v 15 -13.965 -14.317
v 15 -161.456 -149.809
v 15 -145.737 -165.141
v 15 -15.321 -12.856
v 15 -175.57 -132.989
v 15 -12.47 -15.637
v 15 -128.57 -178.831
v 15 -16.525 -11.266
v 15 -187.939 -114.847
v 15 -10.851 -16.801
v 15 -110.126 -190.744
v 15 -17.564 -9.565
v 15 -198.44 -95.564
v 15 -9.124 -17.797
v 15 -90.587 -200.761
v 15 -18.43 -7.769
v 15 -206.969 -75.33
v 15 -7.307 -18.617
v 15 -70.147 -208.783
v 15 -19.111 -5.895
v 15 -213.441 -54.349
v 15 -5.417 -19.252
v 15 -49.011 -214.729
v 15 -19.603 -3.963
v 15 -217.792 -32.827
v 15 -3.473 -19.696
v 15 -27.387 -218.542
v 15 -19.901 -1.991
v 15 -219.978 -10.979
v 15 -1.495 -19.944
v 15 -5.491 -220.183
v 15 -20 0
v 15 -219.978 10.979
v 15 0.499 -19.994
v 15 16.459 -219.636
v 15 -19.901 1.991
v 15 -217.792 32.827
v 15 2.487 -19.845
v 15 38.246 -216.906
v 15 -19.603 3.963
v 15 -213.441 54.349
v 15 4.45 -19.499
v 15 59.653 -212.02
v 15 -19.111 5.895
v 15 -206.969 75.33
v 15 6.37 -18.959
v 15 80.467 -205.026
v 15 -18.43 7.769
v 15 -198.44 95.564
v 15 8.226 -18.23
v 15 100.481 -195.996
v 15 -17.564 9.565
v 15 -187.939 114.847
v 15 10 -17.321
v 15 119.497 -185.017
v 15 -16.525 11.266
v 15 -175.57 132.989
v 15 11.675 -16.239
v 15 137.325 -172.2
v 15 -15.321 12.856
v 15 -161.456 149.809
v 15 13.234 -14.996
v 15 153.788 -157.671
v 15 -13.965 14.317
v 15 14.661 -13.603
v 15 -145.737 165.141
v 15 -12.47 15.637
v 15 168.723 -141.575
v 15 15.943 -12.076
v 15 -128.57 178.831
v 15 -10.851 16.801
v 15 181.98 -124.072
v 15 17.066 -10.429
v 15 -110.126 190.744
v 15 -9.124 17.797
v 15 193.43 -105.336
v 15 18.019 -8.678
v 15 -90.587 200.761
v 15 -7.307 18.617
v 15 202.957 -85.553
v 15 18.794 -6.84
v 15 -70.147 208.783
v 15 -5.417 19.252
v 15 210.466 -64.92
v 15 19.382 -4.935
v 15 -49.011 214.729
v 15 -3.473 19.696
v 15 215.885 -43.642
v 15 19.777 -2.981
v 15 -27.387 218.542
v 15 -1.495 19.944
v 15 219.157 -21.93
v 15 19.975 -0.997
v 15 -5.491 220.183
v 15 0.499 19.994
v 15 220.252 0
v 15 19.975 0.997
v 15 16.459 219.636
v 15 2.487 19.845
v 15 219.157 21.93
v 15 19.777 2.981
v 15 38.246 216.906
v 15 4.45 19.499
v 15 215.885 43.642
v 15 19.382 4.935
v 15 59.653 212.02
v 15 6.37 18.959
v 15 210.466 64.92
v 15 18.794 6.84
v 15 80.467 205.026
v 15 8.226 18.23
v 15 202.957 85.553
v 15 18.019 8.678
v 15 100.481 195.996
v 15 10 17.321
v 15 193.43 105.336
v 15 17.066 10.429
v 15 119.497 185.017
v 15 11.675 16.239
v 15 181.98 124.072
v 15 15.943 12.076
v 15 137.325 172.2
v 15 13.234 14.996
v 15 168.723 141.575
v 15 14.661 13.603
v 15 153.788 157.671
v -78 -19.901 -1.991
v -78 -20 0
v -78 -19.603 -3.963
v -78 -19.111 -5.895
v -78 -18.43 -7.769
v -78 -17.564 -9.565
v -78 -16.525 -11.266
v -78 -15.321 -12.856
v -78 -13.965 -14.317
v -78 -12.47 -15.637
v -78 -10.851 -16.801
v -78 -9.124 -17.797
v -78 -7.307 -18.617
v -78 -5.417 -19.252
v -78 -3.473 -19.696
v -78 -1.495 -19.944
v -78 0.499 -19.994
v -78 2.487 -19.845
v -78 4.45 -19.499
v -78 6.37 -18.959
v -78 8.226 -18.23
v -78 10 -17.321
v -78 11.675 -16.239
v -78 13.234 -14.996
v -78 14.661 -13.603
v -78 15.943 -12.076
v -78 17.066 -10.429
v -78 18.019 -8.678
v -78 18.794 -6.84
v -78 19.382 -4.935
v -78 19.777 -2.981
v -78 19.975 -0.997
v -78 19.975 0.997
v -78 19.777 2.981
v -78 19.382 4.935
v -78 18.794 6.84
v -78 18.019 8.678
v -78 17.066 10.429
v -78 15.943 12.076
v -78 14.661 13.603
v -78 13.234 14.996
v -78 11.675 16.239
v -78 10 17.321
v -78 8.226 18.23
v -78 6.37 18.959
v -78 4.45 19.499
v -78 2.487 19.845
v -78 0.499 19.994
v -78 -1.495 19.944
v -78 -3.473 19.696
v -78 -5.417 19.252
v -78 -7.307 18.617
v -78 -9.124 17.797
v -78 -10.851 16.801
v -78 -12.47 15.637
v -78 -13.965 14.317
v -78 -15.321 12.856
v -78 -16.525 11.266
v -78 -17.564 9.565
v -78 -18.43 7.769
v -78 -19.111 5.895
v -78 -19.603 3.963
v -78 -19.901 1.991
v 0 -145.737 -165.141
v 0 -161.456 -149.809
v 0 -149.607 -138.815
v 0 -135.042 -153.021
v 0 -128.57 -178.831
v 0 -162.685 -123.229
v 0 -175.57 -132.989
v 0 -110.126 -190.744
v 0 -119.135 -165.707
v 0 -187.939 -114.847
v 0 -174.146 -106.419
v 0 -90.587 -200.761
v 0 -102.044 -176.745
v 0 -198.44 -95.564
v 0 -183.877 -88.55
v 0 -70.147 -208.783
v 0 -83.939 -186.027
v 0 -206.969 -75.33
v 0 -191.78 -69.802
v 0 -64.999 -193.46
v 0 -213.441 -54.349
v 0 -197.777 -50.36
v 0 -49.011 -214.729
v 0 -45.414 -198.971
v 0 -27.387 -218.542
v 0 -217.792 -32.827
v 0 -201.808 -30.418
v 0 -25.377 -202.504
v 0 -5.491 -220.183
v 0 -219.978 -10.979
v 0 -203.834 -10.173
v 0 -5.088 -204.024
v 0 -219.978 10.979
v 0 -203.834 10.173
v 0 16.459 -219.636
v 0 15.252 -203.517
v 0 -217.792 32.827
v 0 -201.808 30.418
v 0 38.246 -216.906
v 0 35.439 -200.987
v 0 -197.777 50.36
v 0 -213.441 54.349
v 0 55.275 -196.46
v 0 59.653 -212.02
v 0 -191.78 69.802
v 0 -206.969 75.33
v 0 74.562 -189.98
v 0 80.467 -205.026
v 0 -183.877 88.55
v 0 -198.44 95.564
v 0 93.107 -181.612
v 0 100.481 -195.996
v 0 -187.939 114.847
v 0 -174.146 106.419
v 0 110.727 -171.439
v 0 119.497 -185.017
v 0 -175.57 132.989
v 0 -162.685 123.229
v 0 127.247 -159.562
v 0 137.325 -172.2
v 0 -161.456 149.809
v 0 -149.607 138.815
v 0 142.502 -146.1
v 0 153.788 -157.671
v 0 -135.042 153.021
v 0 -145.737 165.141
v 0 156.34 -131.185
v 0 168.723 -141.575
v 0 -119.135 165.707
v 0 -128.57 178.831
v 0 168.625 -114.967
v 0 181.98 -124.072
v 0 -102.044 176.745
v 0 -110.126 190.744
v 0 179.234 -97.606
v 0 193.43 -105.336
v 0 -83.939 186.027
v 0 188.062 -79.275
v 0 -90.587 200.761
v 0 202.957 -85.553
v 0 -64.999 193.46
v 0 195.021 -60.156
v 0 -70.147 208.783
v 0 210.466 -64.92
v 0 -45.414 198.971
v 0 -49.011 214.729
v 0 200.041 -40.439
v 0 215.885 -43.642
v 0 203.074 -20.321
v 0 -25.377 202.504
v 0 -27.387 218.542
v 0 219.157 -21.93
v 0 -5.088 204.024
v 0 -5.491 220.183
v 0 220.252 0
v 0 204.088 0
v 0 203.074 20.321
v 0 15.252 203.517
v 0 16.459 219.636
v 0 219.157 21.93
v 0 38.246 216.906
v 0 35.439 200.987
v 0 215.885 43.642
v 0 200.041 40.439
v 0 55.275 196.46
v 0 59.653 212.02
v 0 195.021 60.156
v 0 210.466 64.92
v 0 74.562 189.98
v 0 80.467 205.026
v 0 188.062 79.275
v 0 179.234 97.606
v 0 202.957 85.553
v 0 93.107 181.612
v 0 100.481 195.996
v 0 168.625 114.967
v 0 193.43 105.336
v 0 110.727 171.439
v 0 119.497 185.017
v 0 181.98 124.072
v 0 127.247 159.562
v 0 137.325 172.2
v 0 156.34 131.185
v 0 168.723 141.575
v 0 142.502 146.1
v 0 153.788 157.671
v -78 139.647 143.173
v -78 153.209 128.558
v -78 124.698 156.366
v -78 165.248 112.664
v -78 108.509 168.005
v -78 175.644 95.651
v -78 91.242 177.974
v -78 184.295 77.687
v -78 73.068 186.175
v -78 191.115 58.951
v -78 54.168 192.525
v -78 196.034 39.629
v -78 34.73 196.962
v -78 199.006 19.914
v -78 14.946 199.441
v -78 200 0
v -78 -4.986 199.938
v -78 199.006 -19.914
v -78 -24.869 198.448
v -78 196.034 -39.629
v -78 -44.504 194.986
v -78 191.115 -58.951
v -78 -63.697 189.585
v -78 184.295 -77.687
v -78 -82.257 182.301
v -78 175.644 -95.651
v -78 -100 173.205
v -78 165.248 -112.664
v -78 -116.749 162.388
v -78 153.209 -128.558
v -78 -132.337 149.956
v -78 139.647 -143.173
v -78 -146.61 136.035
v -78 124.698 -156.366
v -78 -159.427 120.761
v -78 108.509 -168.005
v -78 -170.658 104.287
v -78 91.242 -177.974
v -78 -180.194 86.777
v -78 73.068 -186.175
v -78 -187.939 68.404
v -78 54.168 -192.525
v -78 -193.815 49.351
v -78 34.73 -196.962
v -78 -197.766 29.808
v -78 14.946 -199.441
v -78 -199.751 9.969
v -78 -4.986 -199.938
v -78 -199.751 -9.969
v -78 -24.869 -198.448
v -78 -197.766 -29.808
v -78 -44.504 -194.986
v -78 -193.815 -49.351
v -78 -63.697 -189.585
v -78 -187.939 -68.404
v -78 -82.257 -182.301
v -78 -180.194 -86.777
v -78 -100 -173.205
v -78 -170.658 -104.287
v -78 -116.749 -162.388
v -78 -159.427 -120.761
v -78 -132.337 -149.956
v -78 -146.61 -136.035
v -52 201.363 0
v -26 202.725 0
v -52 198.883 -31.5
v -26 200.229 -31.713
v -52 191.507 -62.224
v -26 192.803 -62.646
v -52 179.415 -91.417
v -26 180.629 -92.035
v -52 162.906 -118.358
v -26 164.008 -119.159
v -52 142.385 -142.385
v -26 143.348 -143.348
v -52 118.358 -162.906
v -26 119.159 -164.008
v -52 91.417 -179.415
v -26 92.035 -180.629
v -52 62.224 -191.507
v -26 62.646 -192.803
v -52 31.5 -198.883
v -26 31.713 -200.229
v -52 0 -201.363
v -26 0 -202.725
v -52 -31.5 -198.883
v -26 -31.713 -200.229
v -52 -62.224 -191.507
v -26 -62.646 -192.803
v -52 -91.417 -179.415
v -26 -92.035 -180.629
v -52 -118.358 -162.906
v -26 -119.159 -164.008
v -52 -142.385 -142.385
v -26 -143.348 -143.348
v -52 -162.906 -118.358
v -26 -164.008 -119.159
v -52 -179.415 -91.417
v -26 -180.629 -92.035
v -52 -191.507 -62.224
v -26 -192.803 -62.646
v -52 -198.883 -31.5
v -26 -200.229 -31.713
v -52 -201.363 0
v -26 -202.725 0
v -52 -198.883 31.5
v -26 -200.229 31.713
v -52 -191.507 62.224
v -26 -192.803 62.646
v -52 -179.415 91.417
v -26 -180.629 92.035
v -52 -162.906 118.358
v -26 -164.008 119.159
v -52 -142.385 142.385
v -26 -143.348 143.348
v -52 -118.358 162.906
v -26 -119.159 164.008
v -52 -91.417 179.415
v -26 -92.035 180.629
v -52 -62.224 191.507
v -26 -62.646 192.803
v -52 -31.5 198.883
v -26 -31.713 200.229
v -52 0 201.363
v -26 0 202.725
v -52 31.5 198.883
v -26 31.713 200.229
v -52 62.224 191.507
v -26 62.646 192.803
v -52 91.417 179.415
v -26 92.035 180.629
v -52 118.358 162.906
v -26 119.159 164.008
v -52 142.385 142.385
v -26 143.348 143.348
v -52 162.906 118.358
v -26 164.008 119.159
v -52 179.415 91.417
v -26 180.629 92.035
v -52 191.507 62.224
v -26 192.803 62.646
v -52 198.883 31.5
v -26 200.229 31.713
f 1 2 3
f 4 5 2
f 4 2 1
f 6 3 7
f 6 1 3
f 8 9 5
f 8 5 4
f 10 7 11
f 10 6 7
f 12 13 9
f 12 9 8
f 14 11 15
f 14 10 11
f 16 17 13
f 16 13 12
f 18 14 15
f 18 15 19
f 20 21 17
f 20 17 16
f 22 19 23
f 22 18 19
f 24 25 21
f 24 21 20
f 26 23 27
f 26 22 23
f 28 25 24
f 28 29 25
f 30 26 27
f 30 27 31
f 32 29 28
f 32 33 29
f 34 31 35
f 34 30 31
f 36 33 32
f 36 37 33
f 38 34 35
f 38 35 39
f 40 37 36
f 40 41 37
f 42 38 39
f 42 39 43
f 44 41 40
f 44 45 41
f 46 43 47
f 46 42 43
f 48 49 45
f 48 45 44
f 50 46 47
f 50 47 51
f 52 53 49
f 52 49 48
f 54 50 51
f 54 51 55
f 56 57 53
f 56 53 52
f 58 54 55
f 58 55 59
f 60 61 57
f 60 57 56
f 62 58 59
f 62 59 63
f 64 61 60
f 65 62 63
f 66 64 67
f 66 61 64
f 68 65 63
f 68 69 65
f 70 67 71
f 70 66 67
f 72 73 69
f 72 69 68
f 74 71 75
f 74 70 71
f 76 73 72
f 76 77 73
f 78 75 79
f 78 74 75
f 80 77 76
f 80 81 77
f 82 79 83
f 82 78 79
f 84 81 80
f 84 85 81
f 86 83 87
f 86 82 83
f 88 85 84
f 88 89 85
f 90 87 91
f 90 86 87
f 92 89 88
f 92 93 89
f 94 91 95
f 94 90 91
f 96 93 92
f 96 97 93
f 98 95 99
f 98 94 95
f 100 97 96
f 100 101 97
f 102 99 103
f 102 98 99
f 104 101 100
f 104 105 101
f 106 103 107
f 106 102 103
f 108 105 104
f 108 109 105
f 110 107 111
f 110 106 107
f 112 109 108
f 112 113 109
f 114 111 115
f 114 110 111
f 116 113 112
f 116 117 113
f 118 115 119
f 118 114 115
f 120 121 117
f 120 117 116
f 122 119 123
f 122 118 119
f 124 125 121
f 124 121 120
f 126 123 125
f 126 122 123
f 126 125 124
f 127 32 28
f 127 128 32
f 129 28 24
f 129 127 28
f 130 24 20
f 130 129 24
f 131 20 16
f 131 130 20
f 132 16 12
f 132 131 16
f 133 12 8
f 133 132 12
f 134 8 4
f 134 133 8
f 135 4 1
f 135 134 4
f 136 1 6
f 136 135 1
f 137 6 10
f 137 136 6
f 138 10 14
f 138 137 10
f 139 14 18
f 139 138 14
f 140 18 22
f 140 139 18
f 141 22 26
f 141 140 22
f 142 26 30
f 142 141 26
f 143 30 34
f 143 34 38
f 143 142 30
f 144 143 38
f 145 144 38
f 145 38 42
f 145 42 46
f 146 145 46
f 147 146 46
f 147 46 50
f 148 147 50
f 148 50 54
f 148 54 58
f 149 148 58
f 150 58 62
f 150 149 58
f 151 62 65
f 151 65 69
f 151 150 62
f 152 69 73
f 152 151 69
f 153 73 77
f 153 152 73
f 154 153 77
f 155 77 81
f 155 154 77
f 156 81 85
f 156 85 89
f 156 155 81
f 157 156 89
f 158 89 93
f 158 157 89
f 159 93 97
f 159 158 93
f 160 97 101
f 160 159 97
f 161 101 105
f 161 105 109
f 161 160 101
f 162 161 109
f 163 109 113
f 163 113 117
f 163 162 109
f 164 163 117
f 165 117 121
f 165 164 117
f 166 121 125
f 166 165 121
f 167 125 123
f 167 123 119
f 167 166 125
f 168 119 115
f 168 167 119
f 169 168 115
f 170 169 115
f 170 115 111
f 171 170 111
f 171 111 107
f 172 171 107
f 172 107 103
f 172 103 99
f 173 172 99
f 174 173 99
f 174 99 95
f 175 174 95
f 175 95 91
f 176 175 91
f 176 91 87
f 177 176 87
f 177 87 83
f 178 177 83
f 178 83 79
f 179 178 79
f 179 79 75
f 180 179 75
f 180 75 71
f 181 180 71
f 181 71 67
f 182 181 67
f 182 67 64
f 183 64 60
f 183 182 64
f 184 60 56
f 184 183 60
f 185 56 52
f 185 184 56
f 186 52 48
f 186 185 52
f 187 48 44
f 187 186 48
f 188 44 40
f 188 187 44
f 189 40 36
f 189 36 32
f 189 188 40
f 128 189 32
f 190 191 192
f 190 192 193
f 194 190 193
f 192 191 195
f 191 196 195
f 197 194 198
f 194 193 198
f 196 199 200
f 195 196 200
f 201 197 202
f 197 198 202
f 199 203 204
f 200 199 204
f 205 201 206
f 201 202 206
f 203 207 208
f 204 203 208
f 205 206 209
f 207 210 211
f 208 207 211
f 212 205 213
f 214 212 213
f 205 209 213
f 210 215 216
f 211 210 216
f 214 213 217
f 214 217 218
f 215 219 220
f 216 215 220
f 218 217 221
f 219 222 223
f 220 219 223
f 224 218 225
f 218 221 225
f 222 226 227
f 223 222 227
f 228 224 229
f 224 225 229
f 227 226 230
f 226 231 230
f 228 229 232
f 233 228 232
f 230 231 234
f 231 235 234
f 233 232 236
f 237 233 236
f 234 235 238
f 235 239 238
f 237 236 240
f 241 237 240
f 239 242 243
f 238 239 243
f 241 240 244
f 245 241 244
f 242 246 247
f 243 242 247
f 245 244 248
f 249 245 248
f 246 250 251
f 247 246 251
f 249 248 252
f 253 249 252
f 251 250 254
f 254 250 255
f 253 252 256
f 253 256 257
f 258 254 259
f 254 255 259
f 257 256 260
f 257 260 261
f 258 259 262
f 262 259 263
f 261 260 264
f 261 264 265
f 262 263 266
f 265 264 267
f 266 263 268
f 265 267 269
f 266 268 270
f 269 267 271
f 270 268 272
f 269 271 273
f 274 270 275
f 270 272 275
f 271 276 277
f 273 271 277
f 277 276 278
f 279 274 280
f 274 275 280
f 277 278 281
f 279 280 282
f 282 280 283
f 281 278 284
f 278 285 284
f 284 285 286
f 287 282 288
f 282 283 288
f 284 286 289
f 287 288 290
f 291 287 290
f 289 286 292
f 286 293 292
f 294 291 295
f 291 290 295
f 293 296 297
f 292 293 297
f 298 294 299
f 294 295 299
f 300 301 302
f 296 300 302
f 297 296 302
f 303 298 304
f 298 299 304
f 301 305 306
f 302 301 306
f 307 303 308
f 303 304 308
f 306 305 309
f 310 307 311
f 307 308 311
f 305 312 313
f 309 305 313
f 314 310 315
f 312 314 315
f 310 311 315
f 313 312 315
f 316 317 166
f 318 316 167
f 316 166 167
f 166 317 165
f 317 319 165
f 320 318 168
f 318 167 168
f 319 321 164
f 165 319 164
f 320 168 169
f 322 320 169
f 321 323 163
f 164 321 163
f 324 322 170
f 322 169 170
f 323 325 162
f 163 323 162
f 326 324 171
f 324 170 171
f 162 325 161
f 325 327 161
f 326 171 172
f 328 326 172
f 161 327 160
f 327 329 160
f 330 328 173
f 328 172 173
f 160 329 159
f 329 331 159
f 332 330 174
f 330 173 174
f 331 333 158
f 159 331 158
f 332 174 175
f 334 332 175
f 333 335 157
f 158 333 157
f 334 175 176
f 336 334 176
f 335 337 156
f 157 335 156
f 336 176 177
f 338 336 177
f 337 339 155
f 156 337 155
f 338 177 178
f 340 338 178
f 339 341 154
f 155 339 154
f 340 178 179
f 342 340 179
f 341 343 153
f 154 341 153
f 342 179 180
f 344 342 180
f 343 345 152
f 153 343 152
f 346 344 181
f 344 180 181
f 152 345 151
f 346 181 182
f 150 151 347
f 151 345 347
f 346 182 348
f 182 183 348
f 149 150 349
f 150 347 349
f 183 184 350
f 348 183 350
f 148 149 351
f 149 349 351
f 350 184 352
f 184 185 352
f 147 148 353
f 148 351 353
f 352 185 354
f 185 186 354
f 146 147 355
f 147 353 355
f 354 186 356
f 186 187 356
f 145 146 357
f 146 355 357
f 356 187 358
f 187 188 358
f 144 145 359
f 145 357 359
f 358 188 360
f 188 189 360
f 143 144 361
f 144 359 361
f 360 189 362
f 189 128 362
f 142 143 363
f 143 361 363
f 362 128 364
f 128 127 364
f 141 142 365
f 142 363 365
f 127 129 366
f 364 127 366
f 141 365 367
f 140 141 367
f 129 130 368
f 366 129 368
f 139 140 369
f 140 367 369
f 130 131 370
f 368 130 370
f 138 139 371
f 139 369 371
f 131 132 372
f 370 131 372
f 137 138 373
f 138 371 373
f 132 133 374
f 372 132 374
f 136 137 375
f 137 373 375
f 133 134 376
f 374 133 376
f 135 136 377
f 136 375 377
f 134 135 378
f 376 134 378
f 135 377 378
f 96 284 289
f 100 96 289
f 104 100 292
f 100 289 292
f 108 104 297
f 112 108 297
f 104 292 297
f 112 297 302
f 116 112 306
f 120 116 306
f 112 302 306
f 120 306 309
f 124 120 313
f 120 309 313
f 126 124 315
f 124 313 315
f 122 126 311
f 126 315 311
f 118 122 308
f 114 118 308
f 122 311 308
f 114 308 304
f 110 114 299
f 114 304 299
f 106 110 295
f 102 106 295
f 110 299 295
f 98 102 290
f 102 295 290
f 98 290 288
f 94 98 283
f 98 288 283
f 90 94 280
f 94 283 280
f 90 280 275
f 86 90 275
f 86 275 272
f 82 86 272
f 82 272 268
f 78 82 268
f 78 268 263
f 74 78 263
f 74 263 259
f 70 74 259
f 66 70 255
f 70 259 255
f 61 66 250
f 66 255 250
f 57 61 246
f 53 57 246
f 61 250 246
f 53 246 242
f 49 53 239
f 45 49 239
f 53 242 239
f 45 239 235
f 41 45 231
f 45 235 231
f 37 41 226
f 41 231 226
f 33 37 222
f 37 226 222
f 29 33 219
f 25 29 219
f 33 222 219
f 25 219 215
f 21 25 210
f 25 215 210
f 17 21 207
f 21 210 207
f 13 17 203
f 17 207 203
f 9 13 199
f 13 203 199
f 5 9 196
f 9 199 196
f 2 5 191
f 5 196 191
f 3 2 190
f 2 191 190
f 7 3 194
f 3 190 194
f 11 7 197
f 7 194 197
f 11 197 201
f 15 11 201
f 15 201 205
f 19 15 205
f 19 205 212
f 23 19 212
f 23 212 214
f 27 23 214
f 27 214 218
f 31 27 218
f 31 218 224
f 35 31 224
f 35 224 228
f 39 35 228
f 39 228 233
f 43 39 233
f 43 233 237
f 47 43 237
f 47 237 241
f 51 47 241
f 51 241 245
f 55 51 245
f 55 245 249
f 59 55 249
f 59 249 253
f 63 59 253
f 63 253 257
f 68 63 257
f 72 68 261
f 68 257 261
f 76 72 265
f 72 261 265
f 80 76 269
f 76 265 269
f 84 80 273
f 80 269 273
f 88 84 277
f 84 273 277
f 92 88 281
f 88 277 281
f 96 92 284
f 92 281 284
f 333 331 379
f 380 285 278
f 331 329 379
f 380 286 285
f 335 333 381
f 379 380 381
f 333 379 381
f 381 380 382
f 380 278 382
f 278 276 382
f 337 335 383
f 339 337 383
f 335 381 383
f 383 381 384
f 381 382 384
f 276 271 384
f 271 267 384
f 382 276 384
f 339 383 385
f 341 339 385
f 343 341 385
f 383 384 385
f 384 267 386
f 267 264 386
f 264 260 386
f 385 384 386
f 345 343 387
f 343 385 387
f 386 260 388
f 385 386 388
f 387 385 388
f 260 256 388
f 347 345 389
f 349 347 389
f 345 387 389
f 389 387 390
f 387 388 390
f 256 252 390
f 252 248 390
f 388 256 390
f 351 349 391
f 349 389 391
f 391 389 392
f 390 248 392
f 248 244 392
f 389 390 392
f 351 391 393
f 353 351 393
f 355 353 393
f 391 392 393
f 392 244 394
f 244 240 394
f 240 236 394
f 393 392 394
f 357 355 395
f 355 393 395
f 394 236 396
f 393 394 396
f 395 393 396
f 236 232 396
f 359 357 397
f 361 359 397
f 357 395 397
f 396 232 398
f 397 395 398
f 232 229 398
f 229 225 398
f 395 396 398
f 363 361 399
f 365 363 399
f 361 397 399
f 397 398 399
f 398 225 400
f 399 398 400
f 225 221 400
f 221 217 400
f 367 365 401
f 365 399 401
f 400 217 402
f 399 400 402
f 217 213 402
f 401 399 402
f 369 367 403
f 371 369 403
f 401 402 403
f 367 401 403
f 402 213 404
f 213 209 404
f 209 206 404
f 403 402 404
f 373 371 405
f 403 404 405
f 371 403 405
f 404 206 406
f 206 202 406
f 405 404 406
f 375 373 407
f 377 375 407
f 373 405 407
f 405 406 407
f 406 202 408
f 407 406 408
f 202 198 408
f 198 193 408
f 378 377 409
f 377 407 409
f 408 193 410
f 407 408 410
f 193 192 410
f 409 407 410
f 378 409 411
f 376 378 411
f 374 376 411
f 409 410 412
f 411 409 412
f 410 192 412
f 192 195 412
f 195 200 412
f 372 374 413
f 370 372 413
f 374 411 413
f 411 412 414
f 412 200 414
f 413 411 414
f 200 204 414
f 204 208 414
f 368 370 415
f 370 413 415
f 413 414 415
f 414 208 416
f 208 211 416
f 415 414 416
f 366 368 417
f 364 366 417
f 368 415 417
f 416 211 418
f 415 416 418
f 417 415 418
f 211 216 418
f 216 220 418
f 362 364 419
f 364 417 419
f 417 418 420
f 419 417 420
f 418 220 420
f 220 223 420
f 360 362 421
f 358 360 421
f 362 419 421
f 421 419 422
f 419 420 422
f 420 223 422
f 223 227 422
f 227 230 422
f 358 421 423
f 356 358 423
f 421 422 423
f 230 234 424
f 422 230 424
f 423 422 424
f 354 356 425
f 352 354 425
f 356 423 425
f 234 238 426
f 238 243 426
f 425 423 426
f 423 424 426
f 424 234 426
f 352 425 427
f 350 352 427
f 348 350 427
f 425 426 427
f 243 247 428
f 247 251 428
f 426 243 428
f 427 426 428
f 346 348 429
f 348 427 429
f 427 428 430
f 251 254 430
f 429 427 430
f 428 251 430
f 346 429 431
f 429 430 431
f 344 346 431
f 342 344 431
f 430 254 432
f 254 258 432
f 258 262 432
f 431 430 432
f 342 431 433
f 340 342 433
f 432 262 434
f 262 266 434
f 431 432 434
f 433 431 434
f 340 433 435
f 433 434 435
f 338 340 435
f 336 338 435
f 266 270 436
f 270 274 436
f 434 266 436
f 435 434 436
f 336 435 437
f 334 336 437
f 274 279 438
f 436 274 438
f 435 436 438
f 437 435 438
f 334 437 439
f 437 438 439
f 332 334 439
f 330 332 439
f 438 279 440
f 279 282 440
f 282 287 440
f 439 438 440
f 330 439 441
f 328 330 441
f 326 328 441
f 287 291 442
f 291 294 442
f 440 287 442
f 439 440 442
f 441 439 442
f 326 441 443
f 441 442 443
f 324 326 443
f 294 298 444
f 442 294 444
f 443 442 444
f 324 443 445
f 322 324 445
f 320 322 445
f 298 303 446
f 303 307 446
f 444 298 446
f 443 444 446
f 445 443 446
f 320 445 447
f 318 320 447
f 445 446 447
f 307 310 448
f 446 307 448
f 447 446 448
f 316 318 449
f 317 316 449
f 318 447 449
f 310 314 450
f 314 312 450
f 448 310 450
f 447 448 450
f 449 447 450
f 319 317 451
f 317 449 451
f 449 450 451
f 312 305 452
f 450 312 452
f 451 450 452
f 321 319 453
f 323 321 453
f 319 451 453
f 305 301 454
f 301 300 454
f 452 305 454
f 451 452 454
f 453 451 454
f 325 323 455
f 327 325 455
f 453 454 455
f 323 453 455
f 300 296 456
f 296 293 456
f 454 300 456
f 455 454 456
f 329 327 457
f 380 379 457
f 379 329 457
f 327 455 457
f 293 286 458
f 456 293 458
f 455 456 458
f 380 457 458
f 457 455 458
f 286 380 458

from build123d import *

# Parameters (mm, degrees)
SKETCH2_R           = 20
CUT_EXTRUDE1_DEPTH  = 299.977701101
SKETCH3_R           = 220.25163117
SKETCH3_R_2         = 20
BOSS_EXTRUDE1_DEPTH = 15


with BuildPart() as part:
    # Sketch1 → Revolve1 (revolve)
    with BuildSketch(Plane.XY):
        Polygon((0, 0), (-78, 0), (-78, 200), (0, 204.087806784), align=None)
    revolve(axis=Axis((0, 0, 0), (-1, 0, 0)))

    # Sketch2 → Cut-Extrude1 (cut, through all)
    with BuildSketch(Plane.ZY.offset(78)):
        with Locations(Location((0, 0, 0), (0, 0, 270))):
            Circle(SKETCH2_R)
    extrude(amount=-CUT_EXTRUDE1_DEPTH, mode=Mode.SUBTRACT)

    # Sketch3 → Boss-Extrude1 (add)
    with BuildSketch(Plane(origin=(0, 0, 0), x_dir=(0, 0, -1), z_dir=(1, 0, 0))):
        with Locations(Location((0, 0, 0), (0, 0, 90))):
            Circle(SKETCH3_R)
        with Locations(Location((0, 0, 0), (0, 0, 270))):
            Circle(SKETCH3_R_2, mode=Mode.SUBTRACT)
    extrude(amount=BOSS_EXTRUDE1_DEPTH)


solid = part.part
